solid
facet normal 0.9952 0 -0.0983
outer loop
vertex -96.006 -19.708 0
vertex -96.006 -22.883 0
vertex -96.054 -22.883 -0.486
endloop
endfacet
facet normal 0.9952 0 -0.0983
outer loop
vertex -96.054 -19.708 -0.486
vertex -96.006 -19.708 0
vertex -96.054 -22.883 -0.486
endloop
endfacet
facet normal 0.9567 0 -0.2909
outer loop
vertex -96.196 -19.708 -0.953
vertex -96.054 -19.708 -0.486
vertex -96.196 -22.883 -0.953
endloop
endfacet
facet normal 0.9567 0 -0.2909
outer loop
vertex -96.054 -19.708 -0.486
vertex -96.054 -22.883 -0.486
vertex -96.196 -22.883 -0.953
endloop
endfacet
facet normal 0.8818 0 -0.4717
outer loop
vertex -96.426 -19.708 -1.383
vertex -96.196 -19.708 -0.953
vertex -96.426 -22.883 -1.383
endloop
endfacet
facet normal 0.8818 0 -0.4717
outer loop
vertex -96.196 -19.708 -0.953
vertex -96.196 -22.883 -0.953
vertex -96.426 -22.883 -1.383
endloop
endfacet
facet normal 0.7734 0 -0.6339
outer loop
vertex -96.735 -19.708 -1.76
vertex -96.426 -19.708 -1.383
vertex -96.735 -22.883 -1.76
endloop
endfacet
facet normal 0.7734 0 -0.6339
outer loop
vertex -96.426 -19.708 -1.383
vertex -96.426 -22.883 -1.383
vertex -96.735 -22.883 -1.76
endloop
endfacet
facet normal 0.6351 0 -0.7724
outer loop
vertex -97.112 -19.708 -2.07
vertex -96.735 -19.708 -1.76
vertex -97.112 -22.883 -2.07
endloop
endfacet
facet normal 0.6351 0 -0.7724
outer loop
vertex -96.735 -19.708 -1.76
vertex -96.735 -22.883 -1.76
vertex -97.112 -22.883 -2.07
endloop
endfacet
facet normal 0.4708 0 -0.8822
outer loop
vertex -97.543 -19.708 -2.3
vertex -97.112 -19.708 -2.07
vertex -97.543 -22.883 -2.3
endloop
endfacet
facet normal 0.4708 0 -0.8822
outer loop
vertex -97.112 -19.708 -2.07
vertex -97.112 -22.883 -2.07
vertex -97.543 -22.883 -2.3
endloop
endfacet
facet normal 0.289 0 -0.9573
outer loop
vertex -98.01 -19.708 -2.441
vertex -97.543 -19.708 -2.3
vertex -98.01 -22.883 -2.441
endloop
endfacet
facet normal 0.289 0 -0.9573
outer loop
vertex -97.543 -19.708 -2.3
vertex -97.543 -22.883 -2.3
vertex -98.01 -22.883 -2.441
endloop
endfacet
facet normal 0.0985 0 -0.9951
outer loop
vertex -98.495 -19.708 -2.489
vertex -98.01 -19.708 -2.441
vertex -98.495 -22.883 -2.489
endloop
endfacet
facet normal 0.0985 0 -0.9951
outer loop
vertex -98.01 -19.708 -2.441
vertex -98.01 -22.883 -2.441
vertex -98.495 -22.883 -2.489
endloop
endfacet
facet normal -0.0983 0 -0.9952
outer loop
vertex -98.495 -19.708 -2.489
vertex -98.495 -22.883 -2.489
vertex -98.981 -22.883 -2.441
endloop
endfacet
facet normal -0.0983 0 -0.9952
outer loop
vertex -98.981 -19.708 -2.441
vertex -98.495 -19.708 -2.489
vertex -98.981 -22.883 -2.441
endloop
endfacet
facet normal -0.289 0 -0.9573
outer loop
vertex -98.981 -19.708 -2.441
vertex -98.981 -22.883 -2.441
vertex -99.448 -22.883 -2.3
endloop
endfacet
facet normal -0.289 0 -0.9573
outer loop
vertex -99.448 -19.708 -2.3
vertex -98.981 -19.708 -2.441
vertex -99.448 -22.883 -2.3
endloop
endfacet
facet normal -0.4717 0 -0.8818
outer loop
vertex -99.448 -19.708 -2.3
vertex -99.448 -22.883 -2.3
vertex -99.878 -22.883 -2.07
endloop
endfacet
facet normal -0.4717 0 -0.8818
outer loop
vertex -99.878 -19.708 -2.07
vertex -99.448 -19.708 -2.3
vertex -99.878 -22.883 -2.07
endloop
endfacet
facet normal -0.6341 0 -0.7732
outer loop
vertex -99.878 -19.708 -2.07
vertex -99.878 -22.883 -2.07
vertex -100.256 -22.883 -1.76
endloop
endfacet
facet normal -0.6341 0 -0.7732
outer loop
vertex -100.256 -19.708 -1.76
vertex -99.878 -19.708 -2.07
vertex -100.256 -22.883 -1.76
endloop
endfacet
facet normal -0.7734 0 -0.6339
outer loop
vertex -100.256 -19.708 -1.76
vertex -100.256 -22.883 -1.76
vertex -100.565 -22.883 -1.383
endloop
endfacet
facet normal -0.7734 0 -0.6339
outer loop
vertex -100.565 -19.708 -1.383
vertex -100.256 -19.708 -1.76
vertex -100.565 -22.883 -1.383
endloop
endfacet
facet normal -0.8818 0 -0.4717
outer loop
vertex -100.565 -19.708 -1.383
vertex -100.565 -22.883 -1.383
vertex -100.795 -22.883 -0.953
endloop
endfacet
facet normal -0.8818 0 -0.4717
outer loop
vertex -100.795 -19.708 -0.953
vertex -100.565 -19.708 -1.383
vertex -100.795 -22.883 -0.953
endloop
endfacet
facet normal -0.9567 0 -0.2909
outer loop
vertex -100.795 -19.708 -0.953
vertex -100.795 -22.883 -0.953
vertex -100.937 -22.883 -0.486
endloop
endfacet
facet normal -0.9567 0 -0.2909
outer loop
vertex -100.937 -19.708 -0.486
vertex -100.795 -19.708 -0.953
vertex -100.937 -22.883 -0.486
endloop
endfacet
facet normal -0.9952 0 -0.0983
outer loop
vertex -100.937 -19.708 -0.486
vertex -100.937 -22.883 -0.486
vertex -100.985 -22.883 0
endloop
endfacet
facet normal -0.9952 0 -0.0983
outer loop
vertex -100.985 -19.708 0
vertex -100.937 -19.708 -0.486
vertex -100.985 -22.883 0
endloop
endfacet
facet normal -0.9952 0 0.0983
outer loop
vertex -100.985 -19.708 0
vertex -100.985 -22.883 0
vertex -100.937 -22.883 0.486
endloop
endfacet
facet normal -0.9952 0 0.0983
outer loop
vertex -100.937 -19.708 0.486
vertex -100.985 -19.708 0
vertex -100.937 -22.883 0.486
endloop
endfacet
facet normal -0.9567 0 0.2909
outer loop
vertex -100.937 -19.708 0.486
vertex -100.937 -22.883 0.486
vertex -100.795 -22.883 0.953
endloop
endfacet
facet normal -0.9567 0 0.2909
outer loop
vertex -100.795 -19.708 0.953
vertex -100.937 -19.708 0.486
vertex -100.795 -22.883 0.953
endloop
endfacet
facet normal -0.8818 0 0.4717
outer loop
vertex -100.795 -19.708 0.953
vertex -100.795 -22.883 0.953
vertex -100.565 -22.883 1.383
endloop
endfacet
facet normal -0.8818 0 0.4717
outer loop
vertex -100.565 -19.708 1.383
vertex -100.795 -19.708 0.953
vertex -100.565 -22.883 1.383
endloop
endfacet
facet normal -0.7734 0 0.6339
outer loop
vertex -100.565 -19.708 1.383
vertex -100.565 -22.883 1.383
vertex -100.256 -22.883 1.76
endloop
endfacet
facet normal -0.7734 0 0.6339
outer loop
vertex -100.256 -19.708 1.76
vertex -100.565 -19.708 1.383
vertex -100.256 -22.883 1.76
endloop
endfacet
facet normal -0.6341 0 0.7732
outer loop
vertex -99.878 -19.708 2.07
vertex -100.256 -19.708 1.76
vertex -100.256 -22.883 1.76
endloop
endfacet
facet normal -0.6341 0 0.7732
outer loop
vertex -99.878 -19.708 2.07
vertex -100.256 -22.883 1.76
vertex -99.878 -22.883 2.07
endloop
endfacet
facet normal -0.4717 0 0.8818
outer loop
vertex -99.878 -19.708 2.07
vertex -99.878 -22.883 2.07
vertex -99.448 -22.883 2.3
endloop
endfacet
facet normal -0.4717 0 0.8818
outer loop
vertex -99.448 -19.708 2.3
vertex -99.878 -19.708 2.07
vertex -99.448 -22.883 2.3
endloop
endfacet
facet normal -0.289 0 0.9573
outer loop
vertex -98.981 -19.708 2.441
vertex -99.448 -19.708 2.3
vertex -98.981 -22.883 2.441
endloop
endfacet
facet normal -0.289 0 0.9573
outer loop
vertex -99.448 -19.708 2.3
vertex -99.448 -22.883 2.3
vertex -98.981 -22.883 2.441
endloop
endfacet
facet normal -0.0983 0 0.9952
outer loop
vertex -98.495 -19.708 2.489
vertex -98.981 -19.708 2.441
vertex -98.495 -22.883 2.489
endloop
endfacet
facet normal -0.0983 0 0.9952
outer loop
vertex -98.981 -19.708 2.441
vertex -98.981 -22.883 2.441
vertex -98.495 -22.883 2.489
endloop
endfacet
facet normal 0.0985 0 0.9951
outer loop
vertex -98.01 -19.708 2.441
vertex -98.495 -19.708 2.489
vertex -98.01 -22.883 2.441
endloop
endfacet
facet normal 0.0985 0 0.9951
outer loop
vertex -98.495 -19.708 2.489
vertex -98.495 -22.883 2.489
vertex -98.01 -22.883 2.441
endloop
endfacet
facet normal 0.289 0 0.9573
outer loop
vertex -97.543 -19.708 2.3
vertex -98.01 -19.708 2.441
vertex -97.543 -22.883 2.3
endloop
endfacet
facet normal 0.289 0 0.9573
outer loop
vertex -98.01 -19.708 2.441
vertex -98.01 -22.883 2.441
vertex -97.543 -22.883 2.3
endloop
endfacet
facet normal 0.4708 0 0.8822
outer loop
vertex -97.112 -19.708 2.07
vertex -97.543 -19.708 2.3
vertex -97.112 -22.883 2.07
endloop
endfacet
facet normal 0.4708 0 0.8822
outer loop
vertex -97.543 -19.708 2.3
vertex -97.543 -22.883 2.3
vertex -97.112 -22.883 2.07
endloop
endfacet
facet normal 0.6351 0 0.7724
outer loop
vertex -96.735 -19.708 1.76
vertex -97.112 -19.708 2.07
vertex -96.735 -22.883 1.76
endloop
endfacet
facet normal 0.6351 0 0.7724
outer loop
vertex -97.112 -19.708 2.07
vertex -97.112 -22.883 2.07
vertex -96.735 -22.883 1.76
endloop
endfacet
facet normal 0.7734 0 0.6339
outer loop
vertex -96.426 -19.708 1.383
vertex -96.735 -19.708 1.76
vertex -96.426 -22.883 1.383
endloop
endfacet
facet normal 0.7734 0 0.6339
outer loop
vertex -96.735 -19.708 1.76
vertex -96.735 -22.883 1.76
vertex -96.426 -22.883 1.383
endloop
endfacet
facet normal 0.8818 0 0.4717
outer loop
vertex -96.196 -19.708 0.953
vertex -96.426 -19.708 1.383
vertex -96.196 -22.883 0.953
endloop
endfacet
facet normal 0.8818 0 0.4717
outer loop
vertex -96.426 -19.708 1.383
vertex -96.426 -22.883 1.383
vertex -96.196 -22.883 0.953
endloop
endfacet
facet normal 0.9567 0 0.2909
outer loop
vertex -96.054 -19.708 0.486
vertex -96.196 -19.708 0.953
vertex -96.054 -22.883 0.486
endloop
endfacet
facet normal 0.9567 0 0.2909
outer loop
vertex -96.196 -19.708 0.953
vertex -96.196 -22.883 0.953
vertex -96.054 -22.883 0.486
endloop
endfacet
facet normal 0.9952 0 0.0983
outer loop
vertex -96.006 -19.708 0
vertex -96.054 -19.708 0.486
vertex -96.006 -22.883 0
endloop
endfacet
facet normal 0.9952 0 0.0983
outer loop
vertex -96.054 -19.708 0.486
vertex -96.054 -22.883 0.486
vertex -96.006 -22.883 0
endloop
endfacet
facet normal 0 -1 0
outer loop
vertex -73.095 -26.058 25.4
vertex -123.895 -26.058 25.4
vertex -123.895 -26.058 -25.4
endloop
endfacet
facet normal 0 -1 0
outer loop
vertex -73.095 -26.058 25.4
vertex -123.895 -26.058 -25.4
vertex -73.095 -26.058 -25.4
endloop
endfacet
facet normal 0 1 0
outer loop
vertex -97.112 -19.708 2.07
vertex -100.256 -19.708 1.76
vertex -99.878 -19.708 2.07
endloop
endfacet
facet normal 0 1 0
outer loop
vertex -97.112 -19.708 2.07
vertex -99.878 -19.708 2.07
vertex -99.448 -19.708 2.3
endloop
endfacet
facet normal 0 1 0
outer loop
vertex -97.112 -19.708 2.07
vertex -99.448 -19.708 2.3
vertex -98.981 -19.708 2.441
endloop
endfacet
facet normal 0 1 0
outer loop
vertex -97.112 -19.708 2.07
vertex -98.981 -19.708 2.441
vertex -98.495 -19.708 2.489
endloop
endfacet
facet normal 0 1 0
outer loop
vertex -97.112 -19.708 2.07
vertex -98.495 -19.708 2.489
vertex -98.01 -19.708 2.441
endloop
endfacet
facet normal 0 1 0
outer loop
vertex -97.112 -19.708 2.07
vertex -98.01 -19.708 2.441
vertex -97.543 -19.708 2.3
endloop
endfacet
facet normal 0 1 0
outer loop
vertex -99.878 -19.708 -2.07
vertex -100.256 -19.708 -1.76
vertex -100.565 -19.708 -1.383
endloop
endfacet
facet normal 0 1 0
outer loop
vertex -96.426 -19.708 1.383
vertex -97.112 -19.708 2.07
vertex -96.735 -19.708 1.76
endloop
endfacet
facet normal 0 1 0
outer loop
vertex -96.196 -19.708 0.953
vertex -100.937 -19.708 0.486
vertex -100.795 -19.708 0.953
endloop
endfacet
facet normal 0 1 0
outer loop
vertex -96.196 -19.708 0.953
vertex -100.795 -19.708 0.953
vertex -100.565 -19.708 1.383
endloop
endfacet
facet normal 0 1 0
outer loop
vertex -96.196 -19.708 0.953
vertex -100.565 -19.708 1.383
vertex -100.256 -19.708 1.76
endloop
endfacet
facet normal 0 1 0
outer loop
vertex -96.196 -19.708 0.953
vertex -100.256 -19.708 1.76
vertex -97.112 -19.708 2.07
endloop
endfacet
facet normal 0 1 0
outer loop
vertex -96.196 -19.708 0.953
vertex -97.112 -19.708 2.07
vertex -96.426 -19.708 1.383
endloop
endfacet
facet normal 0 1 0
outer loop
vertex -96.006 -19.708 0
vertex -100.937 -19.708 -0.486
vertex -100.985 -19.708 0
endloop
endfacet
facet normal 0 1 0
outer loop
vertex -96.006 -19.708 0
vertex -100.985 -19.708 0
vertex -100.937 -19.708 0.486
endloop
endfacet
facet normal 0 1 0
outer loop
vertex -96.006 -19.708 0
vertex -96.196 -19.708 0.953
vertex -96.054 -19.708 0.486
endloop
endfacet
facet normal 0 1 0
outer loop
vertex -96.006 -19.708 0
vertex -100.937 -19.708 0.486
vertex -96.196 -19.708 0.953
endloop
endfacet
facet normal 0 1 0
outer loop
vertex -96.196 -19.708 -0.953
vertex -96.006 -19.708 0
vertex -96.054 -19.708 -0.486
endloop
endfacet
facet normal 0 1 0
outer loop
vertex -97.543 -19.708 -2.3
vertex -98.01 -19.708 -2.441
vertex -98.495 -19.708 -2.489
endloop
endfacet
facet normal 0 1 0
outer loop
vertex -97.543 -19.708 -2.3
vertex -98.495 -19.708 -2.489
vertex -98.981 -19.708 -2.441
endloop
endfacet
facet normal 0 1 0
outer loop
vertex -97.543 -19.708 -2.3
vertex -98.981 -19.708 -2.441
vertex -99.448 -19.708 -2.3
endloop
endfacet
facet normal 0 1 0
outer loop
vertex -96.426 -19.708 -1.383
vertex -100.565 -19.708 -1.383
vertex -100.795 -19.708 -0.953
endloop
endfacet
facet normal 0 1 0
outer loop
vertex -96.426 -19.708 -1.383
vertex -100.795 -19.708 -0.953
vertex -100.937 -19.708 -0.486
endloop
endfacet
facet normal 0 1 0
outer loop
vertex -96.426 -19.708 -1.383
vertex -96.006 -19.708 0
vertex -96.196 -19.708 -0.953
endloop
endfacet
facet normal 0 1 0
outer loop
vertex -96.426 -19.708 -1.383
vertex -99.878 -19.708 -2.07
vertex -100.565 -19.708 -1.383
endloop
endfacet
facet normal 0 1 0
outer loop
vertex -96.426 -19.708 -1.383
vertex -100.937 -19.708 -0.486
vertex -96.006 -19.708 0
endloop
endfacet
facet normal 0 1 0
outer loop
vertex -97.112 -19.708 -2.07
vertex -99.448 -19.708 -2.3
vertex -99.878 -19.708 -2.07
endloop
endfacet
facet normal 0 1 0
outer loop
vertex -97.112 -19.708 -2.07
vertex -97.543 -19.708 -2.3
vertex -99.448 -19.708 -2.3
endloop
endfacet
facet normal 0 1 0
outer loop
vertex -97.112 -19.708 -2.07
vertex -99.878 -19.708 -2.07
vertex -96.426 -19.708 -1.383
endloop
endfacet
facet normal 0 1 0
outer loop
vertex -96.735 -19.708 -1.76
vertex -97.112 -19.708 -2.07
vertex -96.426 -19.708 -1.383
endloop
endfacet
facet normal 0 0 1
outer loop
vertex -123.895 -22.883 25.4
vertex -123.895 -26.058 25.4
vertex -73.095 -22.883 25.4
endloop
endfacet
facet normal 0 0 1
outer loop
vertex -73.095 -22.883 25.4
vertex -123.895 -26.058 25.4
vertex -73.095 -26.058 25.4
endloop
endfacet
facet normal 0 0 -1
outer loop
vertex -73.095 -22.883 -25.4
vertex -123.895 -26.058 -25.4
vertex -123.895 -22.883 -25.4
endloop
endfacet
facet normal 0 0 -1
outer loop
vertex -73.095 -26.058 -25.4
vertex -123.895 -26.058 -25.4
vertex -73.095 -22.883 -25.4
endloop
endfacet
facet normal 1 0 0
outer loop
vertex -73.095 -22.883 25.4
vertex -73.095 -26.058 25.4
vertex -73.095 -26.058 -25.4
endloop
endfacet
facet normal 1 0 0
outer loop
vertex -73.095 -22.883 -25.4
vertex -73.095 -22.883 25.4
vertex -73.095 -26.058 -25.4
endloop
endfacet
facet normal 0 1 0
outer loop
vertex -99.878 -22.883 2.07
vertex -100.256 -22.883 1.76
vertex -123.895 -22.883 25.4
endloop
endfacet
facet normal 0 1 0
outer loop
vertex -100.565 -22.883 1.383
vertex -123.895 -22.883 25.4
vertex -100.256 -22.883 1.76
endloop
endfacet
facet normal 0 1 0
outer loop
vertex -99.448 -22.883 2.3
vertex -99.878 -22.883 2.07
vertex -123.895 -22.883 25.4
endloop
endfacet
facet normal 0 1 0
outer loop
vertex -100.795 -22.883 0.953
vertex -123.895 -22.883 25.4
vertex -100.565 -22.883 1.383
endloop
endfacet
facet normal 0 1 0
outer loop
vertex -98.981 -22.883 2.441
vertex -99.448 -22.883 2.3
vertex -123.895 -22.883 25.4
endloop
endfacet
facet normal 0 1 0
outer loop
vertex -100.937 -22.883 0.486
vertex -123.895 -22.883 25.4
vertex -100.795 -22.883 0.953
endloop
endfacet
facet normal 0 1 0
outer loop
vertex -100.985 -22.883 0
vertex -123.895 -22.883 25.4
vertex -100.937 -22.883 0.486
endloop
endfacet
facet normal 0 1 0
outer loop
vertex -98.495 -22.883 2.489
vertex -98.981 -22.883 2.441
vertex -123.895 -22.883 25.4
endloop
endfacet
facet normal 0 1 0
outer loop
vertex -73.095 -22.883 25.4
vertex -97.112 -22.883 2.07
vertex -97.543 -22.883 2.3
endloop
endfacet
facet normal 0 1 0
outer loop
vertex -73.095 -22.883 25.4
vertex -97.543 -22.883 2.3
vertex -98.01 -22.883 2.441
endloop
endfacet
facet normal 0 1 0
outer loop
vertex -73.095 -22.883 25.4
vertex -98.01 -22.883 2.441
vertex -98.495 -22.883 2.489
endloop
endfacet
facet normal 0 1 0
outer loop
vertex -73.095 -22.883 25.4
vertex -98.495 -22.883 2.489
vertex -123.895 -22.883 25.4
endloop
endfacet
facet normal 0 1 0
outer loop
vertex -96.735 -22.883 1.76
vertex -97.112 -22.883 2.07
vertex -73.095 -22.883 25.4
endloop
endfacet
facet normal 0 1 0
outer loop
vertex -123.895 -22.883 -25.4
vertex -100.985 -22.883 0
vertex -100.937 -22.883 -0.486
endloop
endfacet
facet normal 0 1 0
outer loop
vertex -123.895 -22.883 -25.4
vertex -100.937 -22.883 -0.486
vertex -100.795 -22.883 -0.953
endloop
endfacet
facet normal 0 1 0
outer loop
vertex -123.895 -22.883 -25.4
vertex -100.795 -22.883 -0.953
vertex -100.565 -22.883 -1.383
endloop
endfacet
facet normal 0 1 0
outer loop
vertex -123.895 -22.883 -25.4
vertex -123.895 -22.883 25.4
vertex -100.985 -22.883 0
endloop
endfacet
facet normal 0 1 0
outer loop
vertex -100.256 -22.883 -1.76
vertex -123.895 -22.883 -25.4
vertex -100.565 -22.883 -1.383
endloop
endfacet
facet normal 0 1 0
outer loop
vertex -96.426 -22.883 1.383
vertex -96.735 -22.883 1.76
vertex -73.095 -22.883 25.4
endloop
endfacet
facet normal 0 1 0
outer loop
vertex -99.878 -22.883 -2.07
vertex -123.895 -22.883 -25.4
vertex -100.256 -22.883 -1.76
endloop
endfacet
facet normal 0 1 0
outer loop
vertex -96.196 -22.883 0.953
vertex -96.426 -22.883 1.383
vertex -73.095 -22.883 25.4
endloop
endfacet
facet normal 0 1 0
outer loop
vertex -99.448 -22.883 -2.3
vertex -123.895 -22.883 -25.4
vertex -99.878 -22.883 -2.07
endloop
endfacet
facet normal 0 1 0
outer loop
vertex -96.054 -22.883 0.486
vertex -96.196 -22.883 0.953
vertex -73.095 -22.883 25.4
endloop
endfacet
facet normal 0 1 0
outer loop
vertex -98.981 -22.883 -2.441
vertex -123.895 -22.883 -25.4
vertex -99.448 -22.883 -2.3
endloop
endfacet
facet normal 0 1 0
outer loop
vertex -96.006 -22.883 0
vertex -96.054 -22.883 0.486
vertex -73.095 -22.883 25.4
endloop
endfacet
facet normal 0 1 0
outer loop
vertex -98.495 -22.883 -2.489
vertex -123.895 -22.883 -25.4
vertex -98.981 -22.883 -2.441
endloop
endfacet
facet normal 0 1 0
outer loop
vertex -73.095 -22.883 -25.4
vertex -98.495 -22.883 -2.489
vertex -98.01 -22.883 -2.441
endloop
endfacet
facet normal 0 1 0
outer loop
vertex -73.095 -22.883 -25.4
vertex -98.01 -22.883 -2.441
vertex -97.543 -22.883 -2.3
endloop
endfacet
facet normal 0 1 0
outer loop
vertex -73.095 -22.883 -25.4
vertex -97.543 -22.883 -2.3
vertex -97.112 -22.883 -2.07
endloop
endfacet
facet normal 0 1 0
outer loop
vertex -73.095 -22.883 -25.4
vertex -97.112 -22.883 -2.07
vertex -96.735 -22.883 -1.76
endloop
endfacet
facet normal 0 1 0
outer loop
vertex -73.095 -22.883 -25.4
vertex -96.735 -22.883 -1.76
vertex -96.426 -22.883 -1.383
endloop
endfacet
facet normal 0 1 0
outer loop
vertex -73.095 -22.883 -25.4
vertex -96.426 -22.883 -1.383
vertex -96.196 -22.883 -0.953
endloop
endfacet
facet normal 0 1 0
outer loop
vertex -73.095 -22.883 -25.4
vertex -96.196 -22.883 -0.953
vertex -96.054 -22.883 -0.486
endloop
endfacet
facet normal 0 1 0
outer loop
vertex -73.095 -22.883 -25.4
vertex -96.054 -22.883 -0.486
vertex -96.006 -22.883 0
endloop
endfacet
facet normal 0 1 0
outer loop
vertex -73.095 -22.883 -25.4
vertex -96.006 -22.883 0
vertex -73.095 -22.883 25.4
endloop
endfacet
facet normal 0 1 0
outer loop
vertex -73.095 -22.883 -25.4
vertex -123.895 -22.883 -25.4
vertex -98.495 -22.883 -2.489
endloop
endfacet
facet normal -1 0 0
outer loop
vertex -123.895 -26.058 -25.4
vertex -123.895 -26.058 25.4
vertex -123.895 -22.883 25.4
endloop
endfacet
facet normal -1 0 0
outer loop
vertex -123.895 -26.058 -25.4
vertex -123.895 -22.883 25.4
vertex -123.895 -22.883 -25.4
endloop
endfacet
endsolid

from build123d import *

# Parameters (mm, degrees)
SKETCH4_R           = 2.4892
BOSS_EXTRUDE1_DEPTH = 6.35
SKETCH6_W           = 50.8
SKETCH6_H           = 50.8
BOSS_EXTRUDE2_DEPTH = 3.175


with BuildPart() as part:
    # Sketch4 → Boss-Extrude1 (new body)
    with BuildSketch(Plane(origin=(0, -26.057660102, 0), x_dir=(1, 0, 0), z_dir=(0, 1, 0))):
        with Locations((-98.4954, 0)):
            Circle(SKETCH4_R)
    extrude(amount=BOSS_EXTRUDE1_DEPTH)

    # Sketch6 → Boss-Extrude2 (add)
    with BuildSketch(Plane(origin=(0, -26.057660102, 0), x_dir=(1, 0, 0), z_dir=(0, 1, 0))):
        with Locations((-98.4954, 0)):
            Rectangle(SKETCH6_W, SKETCH6_H)
    extrude(amount=BOSS_EXTRUDE2_DEPTH)


solid = part.part
